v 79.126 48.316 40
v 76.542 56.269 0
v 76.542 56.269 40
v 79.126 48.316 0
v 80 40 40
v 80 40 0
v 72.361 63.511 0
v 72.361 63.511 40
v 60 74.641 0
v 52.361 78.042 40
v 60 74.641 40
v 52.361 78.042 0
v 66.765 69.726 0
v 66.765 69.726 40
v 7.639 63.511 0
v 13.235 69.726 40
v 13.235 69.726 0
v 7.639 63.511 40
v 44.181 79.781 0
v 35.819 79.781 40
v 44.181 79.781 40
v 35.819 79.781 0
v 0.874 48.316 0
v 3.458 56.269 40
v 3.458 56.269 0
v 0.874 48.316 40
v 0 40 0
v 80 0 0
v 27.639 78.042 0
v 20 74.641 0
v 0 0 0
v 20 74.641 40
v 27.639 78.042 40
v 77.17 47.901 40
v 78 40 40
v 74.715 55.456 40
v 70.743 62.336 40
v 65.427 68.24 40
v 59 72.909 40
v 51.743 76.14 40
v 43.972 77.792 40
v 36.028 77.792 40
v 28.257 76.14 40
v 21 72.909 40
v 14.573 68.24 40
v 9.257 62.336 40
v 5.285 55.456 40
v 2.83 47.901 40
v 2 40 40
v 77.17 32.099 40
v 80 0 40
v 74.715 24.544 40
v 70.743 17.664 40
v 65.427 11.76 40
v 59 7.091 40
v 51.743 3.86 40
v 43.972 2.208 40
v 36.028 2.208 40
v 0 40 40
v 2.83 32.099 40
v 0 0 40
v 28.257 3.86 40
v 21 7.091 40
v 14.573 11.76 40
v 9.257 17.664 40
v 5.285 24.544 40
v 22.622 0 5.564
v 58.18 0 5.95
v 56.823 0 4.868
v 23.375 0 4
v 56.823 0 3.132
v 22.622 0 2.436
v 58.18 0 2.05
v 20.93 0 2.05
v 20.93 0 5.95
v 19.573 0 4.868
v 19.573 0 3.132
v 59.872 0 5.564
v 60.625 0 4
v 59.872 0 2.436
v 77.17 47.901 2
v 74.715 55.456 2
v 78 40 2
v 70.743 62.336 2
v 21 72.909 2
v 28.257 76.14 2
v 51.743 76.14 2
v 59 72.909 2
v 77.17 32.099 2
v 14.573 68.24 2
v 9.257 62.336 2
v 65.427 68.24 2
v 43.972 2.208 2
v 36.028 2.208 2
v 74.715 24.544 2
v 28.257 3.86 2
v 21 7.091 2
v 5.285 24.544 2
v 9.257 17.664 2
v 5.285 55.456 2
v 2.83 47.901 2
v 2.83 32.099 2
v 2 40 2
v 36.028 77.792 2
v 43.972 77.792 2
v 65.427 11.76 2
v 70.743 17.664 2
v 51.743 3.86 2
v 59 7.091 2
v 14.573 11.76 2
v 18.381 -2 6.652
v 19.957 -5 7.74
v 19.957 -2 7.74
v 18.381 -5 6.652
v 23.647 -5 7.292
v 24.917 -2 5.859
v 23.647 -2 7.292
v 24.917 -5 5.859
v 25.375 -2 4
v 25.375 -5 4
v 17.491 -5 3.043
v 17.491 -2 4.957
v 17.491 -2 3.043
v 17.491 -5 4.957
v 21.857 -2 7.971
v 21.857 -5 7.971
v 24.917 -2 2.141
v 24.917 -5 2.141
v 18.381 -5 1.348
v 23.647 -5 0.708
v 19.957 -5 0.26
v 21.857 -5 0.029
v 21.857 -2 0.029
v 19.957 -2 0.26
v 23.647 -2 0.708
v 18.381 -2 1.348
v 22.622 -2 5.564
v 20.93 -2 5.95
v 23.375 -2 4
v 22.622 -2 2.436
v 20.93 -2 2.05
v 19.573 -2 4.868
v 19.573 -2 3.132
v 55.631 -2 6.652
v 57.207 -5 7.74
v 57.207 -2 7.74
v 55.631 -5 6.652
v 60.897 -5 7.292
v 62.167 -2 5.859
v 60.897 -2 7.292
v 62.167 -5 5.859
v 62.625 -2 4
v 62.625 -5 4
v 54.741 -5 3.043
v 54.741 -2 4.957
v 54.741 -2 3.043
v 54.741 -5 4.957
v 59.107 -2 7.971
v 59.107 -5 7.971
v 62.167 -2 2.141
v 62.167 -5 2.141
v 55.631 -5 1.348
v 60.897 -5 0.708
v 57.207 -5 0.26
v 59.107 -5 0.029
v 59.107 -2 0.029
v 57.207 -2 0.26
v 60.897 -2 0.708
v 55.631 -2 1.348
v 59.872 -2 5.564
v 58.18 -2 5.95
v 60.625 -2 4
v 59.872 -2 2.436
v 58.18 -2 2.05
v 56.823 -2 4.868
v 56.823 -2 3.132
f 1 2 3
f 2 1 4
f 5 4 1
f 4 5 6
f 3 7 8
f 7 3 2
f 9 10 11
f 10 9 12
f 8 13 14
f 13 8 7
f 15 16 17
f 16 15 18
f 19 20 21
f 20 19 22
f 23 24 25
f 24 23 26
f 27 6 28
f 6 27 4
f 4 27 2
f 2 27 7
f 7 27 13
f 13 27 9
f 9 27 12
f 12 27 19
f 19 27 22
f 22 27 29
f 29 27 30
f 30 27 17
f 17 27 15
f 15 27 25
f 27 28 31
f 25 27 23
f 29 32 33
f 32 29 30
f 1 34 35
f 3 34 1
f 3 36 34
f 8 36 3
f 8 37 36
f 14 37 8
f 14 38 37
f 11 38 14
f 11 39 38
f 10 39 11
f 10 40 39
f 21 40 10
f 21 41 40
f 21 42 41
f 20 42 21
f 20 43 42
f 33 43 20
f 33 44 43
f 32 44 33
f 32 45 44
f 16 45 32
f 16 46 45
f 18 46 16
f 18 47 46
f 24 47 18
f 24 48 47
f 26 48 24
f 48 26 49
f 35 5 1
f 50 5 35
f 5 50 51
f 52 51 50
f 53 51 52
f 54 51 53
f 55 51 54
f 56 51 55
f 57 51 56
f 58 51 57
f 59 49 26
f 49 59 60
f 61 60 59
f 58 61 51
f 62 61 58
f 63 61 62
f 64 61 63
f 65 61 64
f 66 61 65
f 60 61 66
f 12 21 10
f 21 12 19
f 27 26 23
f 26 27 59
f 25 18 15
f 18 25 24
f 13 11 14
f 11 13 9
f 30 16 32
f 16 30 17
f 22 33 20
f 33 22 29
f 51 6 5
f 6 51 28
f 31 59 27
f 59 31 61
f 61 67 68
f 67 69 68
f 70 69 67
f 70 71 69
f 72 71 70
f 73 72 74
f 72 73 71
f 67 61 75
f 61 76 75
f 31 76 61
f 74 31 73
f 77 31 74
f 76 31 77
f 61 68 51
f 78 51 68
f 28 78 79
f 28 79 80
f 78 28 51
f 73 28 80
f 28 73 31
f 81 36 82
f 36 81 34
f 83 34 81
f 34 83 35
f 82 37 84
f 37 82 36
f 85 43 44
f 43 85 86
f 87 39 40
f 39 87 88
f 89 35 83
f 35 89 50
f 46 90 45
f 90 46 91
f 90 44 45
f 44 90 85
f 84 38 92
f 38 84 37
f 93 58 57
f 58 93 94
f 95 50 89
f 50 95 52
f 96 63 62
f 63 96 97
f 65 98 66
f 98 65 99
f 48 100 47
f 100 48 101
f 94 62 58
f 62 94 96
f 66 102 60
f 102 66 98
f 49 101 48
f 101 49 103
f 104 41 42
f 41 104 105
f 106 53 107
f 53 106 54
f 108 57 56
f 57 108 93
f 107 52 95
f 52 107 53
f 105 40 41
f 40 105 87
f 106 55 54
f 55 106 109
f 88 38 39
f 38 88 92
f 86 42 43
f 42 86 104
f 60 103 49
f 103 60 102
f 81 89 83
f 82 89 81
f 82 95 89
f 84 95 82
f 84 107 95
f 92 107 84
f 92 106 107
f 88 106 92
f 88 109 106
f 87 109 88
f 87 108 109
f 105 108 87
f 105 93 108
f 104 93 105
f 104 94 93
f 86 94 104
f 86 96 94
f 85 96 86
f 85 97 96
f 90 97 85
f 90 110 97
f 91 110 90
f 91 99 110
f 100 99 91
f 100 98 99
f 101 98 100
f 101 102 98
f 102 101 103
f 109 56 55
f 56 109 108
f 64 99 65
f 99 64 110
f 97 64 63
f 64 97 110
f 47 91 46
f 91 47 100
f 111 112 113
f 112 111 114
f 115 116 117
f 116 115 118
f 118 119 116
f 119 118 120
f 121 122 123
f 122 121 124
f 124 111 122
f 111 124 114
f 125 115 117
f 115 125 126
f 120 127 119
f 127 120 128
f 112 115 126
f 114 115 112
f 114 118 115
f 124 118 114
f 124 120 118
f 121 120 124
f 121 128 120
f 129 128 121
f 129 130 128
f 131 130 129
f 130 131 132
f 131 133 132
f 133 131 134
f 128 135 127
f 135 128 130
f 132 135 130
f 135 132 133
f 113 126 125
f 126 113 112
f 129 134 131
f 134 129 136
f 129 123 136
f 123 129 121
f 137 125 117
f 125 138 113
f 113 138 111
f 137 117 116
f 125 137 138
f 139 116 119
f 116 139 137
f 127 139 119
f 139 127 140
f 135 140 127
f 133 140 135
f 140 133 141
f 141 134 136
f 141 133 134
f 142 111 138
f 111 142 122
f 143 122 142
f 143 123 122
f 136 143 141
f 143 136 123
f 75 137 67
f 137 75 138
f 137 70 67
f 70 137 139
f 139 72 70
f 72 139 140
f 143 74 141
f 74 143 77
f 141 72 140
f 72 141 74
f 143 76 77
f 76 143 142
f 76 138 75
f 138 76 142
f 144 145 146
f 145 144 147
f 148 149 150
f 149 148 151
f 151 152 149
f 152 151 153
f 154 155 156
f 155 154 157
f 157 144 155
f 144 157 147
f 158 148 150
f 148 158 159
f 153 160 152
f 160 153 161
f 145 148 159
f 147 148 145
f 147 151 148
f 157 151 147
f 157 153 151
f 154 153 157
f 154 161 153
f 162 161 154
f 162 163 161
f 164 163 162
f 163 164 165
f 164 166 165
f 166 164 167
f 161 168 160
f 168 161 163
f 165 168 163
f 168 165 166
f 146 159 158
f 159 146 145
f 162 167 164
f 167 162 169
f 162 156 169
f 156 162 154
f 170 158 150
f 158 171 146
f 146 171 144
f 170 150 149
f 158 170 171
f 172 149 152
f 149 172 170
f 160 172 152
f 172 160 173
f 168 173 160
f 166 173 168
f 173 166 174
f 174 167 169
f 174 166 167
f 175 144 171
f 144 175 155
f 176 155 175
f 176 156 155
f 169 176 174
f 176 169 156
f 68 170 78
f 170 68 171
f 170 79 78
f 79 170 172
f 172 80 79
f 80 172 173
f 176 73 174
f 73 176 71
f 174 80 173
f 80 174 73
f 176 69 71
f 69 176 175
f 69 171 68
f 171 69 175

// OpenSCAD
// file: modules/module_pegs.scad
module pegs_lux(width,rows)
{
    dia_knob    = 8;
    len_knob    = 3;
    dia_pin     = 4;
    wall        = 2;
    dist        = 37;
    height      = 25;
    
    pegs(dist,height,wall,dia_knob,len_knob,dia_pin,rows);
}

module pegs_hornbach(width,rows)
{
    dia_knob    = 8;
    len_knob    = 3;
    dia_pin     = 4;
    wall        = 2;
    dist        = 45;
    height      = 45;
    
    pegs(dist,height,wall,dia_knob,len_knob,dia_pin);
}

module pegs(dist,height,wall,dia_knob,len_knob,dia_pin,rows)
{
    for(off_y=[0:height:(rows-1)*height])
    {
        translate([dia_knob/2,0,off_y+dia_knob/2])
        {
            for(i=[0:dist:width-dia_knob])
            {
                translate([i+((width-dia_knob)%dist)/2,0,0])
                {
                    peg(wall,dia_knob,len_knob,dia_pin);
                }
            }
        }
    }
}

module peg(wall,dia_knob,len_knob,dia_pin)
{
    rotate([90,0,0])
    {
        translate([0,0,wall])
        {
            cylinder(h=len_knob,d=dia_knob);
        }
        translate([0,0,0])
        {
            cylinder(h=wall,d=dia_pin);
        }
    }
}
// file: modules/module_tube.scad
module tube(width,height,wall)
{
    translate([width/2,width/2,0])
    difference()
    {
        union()
        {
            cylinder(d=width,h=height);
            translate([0,-width/4,height/2])
            {
                cube([width,width/2,height],center=true);
            }
        }
        translate([0,0,wall])
        {
            cylinder(d=width-2*wall,h=height-wall);
        }
    }
}
// main file
include <modules/module_tube.scad>
include <modules/module_pegs.scad>

width=80;
height=40;
wall=2;
rows=1;

tube(width,height,wall);
pegs_lux(width,rows);
